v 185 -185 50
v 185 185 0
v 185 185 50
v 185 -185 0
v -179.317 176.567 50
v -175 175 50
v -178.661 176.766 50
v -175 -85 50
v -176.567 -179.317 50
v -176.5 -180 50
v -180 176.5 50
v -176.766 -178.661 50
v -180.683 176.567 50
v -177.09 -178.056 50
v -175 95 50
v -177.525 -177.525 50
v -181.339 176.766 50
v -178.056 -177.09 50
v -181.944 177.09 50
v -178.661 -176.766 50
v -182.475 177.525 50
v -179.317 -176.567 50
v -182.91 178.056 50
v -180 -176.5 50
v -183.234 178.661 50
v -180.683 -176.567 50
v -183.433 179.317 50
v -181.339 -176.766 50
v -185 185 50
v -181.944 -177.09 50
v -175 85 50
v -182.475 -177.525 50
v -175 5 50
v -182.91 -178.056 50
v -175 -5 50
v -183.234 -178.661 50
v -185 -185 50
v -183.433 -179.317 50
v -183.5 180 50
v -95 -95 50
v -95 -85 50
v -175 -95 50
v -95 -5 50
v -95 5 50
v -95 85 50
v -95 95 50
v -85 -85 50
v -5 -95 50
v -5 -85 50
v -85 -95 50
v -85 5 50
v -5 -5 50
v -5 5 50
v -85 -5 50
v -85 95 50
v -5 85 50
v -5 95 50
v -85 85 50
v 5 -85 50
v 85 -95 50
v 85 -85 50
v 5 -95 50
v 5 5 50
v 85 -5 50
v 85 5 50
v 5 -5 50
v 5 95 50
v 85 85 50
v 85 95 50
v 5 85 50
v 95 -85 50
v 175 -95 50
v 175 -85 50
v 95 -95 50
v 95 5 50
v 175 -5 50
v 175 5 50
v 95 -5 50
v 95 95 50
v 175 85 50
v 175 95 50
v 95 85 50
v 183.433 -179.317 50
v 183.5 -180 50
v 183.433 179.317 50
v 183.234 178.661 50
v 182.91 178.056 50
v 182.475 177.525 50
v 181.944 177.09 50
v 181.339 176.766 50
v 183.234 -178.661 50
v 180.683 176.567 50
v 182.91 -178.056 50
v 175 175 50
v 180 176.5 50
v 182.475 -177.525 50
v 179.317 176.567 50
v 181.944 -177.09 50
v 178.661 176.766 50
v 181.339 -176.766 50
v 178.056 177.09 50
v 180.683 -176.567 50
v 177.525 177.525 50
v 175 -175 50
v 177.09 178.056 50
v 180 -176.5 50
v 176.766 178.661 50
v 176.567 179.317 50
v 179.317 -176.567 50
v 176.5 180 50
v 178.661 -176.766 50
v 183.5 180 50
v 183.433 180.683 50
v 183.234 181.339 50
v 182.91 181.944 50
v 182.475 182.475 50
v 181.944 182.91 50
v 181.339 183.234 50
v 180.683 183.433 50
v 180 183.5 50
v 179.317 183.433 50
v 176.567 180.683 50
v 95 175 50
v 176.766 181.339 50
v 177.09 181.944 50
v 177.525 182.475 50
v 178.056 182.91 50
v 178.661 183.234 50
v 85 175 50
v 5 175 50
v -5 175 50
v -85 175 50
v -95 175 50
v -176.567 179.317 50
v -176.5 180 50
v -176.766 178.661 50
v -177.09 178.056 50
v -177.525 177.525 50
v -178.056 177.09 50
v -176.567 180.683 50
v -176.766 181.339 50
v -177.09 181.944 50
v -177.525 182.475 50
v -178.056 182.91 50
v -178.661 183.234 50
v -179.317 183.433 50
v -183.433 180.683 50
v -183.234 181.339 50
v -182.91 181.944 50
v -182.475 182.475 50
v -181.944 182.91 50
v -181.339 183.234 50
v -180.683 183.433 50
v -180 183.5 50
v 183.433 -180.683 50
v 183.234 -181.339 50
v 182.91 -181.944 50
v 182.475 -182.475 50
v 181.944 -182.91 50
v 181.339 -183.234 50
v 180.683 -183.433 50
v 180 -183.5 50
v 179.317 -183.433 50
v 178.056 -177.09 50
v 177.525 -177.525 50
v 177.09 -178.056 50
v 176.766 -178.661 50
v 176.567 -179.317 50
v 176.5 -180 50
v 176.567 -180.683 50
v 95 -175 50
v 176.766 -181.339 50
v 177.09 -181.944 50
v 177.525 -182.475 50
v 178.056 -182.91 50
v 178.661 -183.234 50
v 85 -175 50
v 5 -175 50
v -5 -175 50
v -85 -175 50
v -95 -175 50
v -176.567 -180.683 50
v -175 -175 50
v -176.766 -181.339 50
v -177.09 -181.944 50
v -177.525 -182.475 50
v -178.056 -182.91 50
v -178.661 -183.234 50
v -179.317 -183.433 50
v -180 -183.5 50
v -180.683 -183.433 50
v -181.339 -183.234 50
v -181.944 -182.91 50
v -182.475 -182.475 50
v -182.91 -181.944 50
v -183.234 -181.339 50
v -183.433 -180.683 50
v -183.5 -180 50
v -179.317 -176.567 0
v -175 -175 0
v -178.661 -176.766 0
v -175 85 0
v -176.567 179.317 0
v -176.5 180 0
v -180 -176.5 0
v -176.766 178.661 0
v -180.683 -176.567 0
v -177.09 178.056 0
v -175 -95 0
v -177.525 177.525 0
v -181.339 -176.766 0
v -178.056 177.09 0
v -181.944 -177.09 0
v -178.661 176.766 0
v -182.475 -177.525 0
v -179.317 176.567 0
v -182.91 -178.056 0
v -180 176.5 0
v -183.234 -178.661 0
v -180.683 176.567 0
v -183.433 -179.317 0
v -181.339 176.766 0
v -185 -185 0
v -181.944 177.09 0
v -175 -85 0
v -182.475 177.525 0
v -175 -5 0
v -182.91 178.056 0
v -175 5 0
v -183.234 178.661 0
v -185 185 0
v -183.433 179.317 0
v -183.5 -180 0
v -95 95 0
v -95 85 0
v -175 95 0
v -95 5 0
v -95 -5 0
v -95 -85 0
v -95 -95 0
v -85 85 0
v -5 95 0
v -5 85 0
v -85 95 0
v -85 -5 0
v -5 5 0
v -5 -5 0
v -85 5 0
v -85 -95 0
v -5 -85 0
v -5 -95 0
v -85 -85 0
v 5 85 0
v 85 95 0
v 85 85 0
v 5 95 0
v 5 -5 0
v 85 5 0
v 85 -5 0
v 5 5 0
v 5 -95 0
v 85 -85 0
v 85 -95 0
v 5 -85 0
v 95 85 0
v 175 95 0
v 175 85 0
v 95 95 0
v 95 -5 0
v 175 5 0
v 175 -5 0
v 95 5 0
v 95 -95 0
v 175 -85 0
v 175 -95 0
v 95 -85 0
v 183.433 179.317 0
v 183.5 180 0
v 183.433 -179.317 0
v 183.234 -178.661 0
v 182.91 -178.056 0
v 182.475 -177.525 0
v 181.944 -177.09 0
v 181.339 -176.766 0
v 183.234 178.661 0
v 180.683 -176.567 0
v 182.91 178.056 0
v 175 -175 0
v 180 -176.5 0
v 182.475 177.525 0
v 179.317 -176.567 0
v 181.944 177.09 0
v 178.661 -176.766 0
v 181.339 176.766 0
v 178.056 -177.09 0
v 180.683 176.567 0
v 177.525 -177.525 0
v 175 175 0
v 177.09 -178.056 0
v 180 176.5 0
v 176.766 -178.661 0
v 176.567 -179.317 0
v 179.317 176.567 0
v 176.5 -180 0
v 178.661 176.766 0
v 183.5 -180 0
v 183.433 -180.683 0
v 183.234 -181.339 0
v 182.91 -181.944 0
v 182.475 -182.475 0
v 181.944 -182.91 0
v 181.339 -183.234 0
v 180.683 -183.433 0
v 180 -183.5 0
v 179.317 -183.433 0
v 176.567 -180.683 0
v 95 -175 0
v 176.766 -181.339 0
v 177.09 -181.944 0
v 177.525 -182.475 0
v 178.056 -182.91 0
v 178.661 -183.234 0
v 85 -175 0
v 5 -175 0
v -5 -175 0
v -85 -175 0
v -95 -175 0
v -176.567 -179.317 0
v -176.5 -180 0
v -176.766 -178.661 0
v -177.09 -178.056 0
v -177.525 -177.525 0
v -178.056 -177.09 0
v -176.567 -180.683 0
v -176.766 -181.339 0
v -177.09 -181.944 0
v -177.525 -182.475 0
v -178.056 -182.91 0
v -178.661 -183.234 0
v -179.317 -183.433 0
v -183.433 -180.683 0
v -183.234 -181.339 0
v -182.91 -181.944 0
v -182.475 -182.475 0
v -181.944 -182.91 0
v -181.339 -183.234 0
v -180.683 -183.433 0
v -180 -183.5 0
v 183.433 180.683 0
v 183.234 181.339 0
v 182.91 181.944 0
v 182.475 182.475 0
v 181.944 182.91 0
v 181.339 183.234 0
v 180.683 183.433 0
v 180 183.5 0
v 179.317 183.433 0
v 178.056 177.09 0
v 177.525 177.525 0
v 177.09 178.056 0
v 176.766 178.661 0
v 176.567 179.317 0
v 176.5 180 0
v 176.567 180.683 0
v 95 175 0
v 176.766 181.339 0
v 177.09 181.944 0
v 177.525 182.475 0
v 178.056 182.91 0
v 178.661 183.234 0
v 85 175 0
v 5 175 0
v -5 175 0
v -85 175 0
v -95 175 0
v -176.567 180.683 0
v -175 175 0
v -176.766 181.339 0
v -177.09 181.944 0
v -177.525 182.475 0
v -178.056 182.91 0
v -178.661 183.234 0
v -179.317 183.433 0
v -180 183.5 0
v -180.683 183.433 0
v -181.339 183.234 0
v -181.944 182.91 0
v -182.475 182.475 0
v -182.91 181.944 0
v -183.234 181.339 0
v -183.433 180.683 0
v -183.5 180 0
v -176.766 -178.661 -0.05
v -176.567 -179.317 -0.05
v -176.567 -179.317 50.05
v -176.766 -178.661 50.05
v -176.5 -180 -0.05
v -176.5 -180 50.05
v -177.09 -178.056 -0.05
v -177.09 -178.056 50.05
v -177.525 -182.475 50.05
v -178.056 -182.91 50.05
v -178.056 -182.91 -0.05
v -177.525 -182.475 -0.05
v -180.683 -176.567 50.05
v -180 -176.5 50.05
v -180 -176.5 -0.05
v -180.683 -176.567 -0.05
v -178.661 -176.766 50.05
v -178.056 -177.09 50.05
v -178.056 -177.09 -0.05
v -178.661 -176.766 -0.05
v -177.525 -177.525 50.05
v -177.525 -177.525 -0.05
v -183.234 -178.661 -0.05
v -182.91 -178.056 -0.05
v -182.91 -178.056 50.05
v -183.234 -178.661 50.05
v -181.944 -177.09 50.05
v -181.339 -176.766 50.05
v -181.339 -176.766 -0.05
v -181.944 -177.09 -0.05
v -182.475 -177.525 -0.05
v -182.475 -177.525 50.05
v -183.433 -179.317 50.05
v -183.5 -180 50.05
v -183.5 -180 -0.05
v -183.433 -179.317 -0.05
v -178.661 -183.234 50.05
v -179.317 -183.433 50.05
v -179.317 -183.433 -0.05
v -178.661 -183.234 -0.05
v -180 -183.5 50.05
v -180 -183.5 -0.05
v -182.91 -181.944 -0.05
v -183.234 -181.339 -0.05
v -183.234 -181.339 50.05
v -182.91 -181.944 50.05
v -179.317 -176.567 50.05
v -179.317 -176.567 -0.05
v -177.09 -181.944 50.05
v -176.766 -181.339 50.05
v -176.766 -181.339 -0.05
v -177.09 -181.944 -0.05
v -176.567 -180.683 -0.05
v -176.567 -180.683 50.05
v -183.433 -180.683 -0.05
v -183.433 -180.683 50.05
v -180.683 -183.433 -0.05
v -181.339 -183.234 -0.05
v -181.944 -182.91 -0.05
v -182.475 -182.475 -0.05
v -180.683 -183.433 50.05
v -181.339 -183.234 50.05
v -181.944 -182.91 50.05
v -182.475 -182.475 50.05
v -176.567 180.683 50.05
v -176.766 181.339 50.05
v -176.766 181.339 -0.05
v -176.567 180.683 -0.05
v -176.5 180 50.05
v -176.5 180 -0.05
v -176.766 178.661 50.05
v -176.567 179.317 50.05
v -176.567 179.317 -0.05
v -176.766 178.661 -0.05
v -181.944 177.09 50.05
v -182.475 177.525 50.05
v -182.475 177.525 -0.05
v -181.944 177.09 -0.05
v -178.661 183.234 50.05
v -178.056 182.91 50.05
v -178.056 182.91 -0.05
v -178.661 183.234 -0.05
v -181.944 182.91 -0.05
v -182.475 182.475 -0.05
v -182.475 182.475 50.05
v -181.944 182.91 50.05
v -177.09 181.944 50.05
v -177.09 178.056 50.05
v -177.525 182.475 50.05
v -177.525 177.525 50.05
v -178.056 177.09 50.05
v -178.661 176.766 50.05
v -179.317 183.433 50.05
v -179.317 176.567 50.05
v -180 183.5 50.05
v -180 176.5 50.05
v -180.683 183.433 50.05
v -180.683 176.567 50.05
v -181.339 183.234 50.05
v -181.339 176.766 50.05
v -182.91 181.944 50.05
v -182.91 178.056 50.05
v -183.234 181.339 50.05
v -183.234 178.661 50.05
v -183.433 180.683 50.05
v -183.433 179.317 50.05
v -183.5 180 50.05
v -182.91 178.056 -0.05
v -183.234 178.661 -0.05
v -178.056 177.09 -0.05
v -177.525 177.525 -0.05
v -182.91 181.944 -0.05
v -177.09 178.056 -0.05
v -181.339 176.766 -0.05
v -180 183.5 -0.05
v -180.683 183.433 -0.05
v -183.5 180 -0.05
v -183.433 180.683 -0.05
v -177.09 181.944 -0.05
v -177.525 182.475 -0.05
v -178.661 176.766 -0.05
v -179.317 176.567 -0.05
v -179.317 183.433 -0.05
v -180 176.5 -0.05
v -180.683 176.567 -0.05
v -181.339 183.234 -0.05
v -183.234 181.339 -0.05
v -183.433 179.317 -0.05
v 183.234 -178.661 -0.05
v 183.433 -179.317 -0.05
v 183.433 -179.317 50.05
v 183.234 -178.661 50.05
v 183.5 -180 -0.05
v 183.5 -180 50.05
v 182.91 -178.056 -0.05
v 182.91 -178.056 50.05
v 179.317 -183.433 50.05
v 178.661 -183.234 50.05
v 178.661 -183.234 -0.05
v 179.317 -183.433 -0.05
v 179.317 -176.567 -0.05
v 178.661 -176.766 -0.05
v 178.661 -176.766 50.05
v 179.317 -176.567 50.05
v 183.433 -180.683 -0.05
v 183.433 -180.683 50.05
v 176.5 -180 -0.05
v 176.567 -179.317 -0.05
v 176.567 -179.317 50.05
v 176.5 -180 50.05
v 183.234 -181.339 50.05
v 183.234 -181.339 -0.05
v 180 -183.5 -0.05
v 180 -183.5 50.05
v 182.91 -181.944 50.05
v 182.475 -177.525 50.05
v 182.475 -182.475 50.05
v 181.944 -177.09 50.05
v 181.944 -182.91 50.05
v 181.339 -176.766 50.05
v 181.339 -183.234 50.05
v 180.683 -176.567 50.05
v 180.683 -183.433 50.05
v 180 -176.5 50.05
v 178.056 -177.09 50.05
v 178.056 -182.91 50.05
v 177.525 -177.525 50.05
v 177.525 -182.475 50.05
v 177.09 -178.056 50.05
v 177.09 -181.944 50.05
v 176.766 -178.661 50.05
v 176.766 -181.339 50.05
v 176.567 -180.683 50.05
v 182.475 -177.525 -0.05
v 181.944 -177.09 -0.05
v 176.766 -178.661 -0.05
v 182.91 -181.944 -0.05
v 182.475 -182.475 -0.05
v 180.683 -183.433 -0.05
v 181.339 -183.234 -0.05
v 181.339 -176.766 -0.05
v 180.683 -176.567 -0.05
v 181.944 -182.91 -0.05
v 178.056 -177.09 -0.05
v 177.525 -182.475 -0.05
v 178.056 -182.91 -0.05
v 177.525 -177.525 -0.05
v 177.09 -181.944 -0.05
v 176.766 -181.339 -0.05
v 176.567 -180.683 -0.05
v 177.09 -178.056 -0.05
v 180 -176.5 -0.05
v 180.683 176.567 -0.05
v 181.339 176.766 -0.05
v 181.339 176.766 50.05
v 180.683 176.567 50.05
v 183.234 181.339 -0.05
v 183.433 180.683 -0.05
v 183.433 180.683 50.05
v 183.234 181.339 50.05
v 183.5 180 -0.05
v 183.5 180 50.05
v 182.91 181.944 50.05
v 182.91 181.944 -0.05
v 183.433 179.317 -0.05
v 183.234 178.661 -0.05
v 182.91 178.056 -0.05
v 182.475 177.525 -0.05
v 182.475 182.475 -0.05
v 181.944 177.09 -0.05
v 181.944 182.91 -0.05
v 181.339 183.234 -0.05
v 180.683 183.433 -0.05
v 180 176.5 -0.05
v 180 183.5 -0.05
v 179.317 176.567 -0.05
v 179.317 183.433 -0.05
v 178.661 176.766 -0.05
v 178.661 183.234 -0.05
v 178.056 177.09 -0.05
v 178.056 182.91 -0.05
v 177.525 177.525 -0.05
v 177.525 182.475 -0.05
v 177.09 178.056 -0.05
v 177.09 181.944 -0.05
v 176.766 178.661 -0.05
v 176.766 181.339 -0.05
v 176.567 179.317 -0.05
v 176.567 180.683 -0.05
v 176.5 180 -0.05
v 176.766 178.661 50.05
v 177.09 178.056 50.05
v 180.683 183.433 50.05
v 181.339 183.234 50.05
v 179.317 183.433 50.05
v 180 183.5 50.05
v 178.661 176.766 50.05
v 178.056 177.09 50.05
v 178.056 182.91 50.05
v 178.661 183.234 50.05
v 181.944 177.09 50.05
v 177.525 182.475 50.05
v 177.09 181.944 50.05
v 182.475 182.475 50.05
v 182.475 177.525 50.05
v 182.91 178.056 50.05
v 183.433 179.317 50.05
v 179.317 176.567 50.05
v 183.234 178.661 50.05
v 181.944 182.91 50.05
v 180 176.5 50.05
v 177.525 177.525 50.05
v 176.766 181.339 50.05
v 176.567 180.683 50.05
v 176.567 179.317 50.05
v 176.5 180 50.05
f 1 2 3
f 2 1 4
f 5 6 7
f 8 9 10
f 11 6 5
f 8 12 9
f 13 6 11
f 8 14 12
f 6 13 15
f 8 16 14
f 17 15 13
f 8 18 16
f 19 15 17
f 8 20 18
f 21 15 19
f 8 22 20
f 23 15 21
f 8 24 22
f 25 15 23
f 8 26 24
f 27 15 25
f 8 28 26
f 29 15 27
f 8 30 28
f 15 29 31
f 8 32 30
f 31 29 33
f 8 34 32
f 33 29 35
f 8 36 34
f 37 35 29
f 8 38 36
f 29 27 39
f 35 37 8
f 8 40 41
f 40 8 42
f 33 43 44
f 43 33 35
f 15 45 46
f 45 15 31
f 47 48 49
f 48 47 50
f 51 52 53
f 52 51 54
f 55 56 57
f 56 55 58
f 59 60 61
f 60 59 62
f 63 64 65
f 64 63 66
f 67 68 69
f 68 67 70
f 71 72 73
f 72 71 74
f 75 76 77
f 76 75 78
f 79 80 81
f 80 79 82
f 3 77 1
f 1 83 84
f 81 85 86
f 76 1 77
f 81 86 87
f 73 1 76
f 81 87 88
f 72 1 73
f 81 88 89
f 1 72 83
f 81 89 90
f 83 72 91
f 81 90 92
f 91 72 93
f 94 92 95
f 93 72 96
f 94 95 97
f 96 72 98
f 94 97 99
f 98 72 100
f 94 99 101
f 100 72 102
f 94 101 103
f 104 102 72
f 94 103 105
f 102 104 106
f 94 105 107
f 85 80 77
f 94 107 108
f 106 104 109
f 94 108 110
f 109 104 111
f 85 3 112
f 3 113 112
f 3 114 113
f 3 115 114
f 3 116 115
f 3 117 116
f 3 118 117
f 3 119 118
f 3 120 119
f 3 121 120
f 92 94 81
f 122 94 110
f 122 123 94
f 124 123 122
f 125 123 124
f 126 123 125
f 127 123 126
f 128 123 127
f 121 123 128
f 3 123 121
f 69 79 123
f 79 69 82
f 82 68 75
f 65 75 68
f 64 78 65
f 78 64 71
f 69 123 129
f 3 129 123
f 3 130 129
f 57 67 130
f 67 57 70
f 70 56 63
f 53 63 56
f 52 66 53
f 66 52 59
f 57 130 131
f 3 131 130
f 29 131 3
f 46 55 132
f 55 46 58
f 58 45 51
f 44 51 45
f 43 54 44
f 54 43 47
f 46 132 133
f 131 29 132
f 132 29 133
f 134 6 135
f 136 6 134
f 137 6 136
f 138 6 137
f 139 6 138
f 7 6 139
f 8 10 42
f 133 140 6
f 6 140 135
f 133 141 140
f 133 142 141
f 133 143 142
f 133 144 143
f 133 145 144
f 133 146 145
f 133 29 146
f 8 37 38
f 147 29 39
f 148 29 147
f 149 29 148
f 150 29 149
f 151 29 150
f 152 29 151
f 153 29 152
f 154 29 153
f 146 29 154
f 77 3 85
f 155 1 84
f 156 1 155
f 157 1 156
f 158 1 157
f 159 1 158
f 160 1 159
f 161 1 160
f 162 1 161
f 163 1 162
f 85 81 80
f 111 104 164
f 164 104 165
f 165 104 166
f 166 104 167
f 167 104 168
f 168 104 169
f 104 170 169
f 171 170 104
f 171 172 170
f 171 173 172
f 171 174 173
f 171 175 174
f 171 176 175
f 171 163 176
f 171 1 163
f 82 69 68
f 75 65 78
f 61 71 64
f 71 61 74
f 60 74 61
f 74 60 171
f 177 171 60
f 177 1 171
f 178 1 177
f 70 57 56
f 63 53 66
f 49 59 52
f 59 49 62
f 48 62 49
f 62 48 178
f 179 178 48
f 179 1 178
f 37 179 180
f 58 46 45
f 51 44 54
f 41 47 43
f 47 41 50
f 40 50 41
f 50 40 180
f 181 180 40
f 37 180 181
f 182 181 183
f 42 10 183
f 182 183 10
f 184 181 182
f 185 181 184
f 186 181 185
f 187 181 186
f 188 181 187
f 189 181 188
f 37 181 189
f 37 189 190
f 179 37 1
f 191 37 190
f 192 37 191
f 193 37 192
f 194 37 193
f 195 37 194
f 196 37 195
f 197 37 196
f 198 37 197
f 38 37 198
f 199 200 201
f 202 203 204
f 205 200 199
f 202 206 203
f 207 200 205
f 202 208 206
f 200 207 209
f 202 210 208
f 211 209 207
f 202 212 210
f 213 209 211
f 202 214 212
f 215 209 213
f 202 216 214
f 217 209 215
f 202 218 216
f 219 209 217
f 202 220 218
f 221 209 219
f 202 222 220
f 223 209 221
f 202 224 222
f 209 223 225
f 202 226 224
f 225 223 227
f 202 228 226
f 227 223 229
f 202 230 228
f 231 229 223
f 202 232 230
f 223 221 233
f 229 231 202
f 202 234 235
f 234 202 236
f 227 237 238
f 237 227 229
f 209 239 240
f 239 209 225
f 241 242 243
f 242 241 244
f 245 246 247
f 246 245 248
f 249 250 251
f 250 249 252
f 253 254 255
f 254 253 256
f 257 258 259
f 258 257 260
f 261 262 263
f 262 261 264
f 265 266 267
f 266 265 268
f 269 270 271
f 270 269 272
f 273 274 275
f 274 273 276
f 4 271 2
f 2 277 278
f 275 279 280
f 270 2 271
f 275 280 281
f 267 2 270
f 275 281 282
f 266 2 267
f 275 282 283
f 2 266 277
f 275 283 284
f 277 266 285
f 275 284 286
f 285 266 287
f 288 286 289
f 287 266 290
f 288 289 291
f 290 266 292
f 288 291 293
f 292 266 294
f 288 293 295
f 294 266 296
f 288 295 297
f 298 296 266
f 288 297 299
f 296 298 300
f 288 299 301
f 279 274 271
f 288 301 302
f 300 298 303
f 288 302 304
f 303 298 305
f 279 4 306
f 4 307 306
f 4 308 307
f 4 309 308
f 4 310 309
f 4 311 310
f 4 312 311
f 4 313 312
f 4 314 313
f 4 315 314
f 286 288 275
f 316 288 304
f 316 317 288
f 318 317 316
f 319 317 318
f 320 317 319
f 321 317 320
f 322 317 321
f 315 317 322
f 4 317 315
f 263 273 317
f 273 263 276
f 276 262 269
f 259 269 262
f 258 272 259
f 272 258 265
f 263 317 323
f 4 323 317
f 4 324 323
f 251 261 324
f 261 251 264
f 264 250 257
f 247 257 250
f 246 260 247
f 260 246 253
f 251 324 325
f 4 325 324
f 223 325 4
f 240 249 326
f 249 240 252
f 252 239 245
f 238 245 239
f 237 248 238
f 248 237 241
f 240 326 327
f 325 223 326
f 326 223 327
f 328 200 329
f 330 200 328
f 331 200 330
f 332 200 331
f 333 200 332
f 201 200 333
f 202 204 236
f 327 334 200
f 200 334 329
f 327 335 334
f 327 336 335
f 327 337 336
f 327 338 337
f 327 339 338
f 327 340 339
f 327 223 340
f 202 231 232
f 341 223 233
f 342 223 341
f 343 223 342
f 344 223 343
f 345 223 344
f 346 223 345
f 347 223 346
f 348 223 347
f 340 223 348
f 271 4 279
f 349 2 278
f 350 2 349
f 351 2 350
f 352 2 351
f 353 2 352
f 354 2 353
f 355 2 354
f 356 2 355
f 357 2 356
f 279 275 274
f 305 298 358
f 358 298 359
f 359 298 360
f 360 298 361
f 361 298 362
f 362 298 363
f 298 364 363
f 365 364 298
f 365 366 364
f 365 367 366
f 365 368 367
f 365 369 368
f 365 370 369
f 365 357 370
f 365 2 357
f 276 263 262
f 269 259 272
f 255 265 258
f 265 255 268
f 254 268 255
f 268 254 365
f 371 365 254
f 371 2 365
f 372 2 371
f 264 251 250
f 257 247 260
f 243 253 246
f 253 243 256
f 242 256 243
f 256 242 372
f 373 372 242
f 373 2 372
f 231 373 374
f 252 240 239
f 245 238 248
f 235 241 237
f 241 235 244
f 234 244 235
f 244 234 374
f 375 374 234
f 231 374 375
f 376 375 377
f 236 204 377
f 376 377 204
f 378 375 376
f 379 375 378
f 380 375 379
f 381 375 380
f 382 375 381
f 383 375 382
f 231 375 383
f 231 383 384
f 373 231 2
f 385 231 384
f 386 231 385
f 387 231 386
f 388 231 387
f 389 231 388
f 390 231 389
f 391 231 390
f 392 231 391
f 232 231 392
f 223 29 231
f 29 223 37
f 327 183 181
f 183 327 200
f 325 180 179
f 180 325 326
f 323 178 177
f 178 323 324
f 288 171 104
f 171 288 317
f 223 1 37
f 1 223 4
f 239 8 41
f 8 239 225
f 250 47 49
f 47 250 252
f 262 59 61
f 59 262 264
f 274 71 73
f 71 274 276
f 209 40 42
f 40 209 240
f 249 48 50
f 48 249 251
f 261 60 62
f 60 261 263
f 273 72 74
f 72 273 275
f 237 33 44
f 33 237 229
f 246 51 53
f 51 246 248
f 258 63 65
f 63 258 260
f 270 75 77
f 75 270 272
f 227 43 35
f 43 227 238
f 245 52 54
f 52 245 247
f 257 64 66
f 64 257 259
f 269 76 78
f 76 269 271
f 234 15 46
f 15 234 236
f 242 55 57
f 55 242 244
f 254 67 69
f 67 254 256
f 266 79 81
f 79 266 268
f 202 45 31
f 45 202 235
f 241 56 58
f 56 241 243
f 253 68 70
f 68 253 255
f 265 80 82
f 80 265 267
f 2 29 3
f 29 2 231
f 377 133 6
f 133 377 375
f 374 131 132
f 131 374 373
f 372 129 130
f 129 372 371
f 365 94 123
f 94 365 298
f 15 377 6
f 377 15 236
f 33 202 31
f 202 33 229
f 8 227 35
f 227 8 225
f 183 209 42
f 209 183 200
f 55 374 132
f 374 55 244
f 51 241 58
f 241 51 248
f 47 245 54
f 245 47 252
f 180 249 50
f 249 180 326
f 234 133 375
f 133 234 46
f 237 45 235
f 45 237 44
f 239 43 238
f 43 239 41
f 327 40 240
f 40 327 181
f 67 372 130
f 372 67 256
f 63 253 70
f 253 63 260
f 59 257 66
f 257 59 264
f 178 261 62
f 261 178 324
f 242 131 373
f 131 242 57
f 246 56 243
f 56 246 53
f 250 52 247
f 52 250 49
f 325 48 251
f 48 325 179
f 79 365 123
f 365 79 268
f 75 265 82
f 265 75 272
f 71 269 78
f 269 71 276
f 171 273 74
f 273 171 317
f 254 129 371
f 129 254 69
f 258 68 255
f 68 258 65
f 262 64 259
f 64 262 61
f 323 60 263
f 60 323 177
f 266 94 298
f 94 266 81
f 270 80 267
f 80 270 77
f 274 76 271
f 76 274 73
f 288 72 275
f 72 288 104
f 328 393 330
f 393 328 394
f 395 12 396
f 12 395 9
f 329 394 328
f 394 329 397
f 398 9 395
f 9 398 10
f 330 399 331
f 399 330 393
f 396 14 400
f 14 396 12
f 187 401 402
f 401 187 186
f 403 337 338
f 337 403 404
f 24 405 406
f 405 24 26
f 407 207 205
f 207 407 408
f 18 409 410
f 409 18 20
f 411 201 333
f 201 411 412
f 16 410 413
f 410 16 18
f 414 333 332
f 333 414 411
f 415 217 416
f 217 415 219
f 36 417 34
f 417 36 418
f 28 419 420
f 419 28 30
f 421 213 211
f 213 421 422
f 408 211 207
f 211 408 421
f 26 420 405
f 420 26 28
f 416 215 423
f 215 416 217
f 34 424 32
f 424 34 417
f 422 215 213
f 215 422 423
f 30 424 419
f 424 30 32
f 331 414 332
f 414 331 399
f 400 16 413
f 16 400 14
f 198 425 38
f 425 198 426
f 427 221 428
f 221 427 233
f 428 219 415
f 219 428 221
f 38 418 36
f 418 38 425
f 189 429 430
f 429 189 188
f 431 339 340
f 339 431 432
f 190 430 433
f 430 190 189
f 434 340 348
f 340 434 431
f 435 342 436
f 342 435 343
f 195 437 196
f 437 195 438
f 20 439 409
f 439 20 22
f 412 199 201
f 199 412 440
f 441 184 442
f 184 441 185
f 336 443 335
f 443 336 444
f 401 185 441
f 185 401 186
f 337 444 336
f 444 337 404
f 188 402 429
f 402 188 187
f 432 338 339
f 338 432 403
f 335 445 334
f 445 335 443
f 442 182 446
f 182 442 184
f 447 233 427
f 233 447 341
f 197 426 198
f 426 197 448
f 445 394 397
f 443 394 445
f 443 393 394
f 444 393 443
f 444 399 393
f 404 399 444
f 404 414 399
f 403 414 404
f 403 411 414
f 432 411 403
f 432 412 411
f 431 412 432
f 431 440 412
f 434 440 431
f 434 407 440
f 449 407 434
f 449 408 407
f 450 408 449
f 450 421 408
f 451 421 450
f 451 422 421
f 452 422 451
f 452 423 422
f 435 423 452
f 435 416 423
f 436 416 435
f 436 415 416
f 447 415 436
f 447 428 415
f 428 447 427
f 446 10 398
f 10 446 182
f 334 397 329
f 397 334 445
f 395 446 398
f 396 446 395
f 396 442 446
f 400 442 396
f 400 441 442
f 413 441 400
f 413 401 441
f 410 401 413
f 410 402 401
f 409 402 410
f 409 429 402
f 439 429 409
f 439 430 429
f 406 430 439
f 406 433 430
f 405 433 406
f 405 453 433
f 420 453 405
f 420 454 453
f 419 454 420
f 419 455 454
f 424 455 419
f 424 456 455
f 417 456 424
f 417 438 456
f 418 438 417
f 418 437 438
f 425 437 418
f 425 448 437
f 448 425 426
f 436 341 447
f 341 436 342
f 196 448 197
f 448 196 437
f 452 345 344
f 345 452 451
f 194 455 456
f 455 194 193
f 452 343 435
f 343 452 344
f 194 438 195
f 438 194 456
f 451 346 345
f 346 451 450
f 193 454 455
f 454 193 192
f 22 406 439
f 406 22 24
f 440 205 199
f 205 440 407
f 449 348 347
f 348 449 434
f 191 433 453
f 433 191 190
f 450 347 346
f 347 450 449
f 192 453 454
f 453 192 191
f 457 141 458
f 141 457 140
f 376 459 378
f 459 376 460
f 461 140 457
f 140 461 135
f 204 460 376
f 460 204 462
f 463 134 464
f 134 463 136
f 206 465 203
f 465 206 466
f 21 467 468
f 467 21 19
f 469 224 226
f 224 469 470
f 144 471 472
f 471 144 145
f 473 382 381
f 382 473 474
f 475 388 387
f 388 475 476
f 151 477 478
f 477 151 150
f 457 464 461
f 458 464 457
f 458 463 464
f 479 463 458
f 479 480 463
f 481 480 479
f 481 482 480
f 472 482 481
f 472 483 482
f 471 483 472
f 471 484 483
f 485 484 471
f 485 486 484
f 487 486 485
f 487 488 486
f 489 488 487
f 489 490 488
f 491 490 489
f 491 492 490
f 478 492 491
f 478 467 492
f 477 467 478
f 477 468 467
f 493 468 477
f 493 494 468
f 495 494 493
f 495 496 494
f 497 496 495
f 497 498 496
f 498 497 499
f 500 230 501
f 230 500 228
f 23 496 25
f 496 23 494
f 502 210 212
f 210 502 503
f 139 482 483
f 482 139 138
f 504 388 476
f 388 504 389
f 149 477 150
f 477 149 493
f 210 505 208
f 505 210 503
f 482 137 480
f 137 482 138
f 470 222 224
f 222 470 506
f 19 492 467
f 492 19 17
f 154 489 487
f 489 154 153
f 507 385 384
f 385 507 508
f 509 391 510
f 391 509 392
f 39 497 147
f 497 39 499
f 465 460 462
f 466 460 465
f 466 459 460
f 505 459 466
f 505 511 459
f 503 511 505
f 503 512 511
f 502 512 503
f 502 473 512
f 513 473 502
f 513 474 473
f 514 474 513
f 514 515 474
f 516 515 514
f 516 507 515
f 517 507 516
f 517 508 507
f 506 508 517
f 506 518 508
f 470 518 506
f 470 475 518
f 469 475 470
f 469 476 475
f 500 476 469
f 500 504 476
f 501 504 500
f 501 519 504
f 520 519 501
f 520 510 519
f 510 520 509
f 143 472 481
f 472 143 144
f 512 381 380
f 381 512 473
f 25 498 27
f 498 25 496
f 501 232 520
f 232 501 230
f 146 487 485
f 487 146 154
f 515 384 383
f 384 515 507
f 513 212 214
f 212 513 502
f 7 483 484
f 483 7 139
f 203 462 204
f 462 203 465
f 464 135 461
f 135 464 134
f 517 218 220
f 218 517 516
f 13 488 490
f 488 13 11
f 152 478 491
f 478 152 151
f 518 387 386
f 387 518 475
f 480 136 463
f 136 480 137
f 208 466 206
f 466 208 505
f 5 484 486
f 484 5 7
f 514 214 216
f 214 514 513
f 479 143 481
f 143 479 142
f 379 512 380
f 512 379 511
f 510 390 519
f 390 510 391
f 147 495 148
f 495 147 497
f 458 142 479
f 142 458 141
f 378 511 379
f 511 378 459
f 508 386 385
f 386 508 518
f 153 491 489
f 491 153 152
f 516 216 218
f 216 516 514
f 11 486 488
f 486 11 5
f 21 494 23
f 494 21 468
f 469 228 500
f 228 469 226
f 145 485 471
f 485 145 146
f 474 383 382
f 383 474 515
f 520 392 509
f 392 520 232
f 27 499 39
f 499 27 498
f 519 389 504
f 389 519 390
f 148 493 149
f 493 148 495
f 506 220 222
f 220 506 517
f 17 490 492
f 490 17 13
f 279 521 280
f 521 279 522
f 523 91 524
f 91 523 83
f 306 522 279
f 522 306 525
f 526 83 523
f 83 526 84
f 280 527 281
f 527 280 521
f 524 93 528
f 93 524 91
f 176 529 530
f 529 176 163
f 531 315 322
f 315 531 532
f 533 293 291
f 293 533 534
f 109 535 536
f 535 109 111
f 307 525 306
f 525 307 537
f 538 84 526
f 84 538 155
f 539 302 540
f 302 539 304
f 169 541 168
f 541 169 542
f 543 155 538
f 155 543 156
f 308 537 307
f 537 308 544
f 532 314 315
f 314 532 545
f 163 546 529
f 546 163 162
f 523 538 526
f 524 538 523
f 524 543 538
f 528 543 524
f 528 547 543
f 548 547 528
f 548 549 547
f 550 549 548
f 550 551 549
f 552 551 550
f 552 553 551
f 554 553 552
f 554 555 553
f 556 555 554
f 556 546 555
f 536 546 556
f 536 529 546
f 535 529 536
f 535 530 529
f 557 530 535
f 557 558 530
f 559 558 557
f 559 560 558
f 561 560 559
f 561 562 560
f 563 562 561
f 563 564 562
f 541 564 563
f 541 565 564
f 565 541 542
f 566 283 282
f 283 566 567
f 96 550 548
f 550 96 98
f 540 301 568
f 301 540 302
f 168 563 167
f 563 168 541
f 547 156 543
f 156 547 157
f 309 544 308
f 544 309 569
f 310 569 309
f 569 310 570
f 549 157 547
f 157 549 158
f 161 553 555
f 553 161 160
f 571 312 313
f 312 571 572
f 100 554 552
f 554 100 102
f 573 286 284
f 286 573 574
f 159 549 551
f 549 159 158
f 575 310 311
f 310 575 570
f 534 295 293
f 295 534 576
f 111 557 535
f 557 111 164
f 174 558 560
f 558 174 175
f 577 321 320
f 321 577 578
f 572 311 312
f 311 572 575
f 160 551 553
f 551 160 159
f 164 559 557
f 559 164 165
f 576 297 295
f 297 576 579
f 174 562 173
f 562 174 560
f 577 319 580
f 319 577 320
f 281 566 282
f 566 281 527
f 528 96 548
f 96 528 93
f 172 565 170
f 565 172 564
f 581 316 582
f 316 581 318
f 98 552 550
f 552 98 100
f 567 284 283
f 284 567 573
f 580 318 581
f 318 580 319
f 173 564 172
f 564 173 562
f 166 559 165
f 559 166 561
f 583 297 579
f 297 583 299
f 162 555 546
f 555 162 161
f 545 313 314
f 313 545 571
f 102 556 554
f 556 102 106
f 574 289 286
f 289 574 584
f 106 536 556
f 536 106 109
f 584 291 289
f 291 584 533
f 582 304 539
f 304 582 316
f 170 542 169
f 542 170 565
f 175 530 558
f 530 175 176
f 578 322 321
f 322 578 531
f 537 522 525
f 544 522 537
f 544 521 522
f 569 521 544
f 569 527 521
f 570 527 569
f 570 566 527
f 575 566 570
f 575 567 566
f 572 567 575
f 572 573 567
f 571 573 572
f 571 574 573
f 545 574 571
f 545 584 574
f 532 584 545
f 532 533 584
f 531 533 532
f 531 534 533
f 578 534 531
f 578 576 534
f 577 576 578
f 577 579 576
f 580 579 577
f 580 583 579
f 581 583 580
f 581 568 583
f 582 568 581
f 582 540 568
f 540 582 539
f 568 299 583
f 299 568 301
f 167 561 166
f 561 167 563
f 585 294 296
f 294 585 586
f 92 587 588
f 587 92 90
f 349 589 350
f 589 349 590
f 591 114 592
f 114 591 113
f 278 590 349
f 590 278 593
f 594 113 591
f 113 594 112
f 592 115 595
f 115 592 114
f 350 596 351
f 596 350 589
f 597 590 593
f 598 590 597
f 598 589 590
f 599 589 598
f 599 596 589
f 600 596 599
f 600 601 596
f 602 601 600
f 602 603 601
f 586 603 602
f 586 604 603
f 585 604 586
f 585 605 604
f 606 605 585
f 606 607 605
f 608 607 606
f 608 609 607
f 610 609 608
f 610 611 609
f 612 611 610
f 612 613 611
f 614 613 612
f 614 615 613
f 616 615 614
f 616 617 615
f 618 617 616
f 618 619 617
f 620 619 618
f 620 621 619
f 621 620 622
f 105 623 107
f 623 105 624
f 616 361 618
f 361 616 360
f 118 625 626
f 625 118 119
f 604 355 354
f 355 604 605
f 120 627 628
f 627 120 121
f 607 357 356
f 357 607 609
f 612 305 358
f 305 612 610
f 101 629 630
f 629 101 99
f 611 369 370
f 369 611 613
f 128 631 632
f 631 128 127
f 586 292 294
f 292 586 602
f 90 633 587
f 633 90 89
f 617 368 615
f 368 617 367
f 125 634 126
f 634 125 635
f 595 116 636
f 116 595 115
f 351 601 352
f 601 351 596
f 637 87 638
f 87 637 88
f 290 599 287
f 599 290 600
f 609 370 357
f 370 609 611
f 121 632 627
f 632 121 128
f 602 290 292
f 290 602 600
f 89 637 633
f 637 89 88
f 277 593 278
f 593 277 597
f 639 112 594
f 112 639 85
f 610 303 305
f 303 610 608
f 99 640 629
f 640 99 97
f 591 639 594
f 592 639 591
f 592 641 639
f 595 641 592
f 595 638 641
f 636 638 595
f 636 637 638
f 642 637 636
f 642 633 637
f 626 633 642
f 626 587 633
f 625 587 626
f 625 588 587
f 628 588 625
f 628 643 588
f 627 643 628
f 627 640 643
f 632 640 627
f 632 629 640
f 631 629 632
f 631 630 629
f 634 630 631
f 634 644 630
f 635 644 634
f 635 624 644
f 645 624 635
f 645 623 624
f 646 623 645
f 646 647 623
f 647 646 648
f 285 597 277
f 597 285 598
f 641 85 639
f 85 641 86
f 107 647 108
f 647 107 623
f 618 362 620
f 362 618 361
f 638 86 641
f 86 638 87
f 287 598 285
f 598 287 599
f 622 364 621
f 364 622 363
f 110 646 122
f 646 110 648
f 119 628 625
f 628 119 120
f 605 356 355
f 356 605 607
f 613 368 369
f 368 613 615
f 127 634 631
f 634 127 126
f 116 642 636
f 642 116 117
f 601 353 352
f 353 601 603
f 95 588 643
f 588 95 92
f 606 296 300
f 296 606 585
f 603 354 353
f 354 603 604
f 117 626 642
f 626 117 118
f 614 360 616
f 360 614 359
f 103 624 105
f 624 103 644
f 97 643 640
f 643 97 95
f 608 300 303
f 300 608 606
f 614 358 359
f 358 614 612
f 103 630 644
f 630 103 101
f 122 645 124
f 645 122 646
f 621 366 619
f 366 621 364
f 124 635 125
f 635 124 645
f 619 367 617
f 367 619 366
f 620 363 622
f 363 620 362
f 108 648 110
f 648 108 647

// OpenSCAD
// Part Name: Cage_Layer_1_H50mm
// This part represents a horizontal slice of the cage.
// It is designed to be 3D printed on its base.

// Parameters for the cage
bar_t = 10;
gap_xy = 80;
hole_d = 7;
cage_ext_xy = 370;

// Calculate bar center positions relative to the overall cage center
bar_centers_xy = [for (j = [0:4]) (-cage_ext_xy/2 + bar_t/2 + j * (bar_t + gap_xy))];

// Module to generate a single layer segment
module cage_layer_segment(height) {
    // Offset for printing on z=0 plane. The module itself is centered on XY=0, so this Z offset moves its base to Z=0.
    translate([0, 0, height/2]) {
        union() {
            // Horizontal bars (along X)
            for (y_center = bar_centers_xy) {
                translate([0, y_center, 0])
                cube([cage_ext_xy, bar_t, height], center = true);
            }

            // Vertical bars (along Y)
            for (x_center = bar_centers_xy) {
                translate([x_center, 0, 0])
                cube([bar_t, cage_ext_xy, height], center = true);
            }

            // Subtract holes for M6 rods at the 4 corners
            corner_offsets_xy = [bar_centers_xy[0], bar_centers_xy[4]];

            for (x_offset = corner_offsets_xy) {
                for (y_offset = corner_offsets_xy) {
                    // Hole through the center of the corner bar
                    translate([x_offset, y_offset, 0])
                    cylinder(h = height + 0.1, d = hole_d, center = true, $fn=32); // +0.1 for clean cut
                }
            }
        }
    }
}

// Render the segment
cage_layer_segment(50);
